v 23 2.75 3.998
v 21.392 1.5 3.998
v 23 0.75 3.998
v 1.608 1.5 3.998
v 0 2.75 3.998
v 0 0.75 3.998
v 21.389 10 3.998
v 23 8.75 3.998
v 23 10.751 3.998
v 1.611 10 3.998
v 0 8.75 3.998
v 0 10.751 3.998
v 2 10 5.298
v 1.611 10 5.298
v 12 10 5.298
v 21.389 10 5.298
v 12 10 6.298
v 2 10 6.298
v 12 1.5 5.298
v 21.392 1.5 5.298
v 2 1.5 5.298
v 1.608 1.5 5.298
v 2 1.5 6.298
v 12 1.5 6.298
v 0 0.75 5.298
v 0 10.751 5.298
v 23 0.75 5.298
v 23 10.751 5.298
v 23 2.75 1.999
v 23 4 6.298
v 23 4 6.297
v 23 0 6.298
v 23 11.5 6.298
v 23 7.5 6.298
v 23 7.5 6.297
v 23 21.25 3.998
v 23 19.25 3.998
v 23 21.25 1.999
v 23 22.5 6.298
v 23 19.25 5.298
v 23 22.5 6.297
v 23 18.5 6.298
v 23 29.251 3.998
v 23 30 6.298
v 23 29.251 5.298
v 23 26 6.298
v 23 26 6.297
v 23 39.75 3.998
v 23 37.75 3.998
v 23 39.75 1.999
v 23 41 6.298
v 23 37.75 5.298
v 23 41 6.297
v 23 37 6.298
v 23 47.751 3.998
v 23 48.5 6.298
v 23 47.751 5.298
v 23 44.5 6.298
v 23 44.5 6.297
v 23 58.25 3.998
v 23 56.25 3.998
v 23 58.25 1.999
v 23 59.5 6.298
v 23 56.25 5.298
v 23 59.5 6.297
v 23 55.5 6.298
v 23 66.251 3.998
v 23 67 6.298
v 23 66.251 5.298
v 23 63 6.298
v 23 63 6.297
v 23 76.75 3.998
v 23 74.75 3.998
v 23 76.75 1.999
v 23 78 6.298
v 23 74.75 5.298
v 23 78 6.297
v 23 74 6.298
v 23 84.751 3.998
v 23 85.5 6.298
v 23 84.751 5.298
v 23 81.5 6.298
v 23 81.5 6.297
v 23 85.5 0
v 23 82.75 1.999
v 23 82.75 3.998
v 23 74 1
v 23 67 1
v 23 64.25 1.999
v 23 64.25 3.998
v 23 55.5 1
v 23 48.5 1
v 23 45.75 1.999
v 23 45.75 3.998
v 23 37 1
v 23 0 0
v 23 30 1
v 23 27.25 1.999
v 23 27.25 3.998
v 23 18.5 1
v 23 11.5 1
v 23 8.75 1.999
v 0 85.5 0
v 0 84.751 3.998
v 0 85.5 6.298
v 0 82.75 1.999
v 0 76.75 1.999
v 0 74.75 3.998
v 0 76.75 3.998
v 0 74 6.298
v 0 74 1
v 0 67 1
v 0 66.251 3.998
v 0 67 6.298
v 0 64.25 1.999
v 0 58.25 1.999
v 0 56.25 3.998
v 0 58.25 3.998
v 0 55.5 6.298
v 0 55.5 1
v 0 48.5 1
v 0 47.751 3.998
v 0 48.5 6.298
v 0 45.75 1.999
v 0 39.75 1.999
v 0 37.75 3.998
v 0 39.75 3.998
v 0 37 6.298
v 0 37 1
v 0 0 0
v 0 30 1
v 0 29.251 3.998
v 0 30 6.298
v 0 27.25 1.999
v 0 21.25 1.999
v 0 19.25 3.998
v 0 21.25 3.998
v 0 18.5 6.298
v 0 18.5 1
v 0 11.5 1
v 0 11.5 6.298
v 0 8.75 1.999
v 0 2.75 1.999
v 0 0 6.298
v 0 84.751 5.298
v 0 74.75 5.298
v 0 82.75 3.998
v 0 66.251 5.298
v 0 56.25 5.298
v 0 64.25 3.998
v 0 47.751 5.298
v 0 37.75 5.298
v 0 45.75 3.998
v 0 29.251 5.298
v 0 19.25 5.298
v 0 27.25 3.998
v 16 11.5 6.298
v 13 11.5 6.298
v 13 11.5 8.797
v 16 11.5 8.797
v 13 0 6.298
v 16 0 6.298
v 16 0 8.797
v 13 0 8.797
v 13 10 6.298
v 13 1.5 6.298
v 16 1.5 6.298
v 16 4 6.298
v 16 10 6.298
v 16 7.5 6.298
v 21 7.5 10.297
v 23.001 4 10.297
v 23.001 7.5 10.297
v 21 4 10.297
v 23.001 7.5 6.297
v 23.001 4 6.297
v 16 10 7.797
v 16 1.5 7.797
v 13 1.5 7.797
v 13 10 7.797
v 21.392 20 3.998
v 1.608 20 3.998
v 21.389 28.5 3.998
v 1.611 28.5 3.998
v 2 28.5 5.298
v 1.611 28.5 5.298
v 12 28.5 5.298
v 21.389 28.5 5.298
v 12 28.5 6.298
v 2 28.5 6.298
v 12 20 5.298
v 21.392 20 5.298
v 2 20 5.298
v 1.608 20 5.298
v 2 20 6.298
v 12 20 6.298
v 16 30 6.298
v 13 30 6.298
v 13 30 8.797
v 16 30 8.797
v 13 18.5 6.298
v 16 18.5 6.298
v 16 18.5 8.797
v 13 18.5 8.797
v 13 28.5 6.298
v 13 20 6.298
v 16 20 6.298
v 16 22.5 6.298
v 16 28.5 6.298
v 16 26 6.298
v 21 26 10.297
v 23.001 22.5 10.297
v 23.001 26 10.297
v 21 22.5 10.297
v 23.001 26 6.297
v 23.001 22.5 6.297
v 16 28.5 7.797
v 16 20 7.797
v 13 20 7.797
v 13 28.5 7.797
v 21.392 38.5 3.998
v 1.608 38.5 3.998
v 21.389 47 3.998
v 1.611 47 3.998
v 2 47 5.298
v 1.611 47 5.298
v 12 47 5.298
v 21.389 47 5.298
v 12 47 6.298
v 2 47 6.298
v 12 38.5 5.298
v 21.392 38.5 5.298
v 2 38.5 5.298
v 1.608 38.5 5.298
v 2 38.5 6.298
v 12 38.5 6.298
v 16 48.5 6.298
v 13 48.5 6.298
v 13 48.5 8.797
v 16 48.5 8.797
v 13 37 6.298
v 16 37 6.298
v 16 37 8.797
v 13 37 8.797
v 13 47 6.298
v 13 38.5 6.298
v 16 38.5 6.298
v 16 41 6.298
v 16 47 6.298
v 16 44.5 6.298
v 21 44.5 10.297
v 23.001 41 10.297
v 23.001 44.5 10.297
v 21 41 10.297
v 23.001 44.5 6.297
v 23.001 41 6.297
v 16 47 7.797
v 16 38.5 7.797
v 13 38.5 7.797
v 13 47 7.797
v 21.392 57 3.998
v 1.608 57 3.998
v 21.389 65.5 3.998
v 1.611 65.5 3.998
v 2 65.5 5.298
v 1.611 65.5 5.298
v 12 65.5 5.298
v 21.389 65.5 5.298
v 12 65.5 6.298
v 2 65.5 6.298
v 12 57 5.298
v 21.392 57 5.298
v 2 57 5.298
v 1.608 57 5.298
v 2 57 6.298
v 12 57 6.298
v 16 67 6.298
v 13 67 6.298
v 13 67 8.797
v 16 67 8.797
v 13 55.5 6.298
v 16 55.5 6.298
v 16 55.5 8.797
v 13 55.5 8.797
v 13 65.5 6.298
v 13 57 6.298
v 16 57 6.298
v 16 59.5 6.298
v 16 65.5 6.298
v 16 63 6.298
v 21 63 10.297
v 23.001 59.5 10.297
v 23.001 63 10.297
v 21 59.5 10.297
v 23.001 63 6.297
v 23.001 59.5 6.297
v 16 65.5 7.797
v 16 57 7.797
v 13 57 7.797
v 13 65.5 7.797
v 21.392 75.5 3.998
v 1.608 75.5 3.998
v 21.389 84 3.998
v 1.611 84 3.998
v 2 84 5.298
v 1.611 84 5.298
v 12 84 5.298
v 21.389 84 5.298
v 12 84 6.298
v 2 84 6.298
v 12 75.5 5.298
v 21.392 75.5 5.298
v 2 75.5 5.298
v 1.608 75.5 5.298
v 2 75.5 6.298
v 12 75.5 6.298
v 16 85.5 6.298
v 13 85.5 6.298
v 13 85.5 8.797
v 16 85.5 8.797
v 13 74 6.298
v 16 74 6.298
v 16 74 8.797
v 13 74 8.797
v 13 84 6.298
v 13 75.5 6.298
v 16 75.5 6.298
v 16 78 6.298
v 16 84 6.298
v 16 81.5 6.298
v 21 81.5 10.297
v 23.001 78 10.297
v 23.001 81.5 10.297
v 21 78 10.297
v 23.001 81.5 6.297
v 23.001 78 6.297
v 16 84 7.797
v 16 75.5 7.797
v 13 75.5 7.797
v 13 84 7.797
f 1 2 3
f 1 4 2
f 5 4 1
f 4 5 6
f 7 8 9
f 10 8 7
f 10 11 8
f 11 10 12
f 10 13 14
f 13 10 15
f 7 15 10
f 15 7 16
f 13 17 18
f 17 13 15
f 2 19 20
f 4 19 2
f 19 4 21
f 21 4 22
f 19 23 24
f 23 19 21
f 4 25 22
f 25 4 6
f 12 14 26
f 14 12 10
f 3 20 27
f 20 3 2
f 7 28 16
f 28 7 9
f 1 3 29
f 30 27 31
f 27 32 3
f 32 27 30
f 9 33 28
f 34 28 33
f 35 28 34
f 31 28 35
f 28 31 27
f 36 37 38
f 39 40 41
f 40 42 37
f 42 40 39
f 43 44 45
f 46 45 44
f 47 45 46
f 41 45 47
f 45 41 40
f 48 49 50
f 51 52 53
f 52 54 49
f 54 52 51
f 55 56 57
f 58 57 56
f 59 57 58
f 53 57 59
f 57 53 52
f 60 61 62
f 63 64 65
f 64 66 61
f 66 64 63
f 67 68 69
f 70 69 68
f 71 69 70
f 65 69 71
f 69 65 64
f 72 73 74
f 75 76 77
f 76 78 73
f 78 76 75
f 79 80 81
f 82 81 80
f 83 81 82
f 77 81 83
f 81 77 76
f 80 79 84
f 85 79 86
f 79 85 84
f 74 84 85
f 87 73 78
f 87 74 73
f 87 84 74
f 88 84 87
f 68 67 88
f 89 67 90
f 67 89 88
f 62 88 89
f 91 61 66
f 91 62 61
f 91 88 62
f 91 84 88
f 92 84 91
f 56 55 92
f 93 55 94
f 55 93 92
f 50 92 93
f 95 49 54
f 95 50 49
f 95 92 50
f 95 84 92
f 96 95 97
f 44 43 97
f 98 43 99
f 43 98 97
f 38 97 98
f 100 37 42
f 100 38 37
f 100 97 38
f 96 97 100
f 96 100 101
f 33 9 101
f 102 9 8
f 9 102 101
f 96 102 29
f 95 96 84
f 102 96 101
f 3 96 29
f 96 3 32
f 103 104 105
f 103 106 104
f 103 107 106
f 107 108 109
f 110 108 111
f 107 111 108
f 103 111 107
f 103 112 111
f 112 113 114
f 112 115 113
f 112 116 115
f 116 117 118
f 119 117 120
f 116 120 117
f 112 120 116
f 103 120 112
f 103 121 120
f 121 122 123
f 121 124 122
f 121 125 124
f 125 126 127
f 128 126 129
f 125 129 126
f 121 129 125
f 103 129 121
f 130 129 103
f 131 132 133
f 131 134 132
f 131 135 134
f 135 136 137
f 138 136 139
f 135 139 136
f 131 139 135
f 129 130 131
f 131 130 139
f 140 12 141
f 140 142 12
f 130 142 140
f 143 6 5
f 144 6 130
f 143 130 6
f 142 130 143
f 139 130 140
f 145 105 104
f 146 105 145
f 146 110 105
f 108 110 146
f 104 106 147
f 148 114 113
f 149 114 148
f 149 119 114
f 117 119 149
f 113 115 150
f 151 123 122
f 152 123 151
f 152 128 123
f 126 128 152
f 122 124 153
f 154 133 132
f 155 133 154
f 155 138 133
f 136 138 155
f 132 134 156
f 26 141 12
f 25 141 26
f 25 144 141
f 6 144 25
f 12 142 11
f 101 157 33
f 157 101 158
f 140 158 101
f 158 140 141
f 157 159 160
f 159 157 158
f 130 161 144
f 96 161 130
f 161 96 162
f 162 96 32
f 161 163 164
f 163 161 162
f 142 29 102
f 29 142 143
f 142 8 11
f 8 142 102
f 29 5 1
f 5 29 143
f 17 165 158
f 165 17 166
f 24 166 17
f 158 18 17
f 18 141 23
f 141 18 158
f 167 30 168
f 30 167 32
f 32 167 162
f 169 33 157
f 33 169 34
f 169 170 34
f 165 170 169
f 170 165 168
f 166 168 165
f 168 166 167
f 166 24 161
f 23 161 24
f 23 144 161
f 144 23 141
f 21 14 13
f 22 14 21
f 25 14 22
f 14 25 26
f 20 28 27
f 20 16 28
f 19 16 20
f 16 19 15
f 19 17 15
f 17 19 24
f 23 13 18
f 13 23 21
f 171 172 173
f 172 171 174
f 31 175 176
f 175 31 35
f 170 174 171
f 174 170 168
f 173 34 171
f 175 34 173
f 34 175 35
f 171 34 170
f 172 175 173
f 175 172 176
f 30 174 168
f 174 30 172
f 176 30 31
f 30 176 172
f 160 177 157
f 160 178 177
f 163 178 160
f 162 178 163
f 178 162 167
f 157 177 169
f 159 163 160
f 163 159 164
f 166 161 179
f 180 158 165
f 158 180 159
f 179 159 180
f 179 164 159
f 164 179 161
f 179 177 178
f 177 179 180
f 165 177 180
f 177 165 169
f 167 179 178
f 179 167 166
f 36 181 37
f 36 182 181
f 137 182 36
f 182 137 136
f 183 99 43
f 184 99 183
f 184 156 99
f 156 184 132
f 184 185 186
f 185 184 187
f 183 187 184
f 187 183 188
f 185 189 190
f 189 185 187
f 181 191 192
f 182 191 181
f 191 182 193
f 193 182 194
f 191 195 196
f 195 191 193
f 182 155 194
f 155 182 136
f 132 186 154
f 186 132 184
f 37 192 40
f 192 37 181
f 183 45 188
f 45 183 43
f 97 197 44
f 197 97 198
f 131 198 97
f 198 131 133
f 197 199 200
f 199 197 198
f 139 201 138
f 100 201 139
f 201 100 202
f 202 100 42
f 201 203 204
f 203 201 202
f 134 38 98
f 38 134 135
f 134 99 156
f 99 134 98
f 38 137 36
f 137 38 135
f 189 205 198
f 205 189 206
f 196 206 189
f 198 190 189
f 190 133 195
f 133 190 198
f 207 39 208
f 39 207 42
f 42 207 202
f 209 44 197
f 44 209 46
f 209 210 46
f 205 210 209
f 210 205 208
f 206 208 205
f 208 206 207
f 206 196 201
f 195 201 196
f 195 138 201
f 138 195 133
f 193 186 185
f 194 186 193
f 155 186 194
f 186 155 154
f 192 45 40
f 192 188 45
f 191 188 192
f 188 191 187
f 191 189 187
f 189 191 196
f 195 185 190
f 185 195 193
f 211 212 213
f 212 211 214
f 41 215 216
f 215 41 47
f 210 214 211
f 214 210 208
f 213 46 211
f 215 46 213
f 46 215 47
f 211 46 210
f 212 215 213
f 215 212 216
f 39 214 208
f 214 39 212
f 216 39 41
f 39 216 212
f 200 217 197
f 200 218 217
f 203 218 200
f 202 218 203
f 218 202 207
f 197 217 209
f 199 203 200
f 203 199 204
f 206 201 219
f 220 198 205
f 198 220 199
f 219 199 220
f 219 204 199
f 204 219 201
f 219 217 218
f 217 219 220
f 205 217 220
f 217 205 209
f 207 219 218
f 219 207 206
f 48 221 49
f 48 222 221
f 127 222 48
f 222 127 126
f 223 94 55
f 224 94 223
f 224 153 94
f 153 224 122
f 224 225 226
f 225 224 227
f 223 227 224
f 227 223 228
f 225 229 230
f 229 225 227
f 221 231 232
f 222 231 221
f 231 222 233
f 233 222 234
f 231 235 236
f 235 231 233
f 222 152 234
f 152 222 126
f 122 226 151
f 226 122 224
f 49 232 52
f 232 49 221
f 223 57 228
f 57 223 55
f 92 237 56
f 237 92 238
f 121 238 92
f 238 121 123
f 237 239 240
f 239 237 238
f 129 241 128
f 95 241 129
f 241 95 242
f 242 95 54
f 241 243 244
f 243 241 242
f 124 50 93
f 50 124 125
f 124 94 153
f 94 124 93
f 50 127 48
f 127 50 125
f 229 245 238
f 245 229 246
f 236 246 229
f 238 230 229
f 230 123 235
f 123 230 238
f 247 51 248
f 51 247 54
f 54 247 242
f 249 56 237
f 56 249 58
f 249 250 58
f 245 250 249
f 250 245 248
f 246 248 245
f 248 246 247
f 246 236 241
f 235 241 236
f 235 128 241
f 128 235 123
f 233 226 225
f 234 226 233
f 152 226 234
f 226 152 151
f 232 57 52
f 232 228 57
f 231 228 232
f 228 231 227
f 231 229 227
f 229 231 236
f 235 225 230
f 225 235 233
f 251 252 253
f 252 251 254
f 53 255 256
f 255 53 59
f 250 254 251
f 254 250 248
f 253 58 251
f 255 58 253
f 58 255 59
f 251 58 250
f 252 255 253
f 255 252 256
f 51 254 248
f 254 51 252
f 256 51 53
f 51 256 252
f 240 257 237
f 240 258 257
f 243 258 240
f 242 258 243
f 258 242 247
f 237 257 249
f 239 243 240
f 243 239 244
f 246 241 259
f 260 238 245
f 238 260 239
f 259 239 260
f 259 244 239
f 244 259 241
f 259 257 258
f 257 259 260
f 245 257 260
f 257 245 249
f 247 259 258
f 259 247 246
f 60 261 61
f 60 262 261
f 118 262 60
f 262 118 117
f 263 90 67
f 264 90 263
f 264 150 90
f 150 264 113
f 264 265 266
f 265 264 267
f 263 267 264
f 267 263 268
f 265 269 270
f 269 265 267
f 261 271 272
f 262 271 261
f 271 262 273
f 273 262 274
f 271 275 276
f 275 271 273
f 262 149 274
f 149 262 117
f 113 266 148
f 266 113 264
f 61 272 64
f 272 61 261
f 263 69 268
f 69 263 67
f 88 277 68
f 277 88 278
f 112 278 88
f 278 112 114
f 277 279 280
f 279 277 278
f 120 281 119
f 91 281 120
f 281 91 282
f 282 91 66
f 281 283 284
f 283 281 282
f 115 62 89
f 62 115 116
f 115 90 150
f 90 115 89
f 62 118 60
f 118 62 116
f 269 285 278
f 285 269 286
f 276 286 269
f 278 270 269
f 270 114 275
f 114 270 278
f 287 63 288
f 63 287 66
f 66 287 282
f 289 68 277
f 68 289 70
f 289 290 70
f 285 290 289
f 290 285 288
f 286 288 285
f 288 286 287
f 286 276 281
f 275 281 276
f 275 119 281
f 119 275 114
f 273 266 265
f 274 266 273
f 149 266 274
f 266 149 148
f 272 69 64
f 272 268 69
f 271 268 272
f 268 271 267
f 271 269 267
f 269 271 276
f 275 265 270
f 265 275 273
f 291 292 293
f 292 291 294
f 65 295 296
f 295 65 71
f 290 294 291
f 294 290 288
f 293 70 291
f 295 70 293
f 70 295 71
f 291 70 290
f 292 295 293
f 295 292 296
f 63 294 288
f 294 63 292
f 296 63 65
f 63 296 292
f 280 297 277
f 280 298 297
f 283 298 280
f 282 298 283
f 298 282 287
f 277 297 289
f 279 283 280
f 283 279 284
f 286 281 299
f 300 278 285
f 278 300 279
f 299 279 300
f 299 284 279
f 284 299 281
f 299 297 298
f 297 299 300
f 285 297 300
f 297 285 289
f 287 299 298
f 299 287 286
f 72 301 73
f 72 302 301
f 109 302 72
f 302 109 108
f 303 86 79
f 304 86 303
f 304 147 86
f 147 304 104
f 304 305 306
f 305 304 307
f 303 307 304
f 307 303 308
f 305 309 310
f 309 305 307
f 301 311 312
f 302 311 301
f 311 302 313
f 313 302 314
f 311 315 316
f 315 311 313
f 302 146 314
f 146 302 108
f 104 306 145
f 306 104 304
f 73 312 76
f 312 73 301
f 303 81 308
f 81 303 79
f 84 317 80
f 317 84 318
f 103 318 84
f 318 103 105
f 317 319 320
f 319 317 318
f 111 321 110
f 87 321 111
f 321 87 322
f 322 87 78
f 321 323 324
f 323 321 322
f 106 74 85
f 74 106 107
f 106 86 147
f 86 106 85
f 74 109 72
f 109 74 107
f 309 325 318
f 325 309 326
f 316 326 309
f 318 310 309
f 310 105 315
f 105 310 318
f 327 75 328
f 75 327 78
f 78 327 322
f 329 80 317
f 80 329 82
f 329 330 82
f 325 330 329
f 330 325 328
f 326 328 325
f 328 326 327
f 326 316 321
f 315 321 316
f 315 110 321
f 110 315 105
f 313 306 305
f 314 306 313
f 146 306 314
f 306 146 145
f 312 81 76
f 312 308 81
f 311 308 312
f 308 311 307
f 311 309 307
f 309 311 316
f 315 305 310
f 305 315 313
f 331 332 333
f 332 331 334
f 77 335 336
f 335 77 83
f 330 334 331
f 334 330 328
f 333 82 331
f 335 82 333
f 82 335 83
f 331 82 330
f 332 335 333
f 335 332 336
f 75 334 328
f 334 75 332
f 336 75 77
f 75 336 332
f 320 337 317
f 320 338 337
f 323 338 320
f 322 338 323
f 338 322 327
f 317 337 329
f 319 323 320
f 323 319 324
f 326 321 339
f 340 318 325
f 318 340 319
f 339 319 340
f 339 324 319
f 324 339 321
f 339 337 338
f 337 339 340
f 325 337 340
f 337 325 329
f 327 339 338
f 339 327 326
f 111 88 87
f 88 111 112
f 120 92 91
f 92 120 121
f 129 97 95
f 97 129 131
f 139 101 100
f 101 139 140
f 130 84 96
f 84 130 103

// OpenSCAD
// TODO: cleanup.

eps1 = 0.001;
eps2 = 2*eps1;

// Main body
total_length = 23;  // should be 23
side_wall_width = 1.5;
bottom_thickness = 1; 


// base slot
tape_slot_width = 8.5;
tape_slot_height = 1.3;


// Part slot
part_slot_width = 6;
part_slot_height = 2;

part_slot_taper_angle = 25;

top_thickness = 1;

bridge_gap = 1.5;
bridge_width = 3;
bridge_top_thickness = 1;
bridge_height = bridge_gap + bridge_top_thickness;


ramp_width = 3.5;
ramp_height = 4;
ramp_length = 5;
ramp_tail_length = 2;
ramp_offset = 16;

plate_thickness = 1;
array_size = 5;
inter_unit_space = 7;

base_length = total_length;
base_height = bottom_thickness + part_slot_height + tape_slot_height;
base_width = tape_slot_width + 2*side_wall_width;


module tape_slot_taper(x, y, a) {
  translate([x, y, 0])
  rotate([0, 0, a])
  translate([-3*side_wall_width/2, 0, 0])  cube([3*side_wall_width, eps1, tape_slot_height+eps2]);
}

module base_body() {
  cube([base_length, base_width, base_height]);
}

module parts_slot() {
 translate([-eps1, (base_width-part_slot_width)/2, 0]) 
    cube([base_length+eps2, part_slot_width, part_slot_height]);  
}

module tape_slot() {
 a = part_slot_taper_angle;
 translate([-eps1, (base_width-tape_slot_width)/2, 0]) cube([base_length+eps2, tape_slot_width, tape_slot_height+eps2]);

 hull() {
  tape_slot_taper(0,  side_wall_width/2, a);
  tape_slot_taper(0, base_width - side_wall_width/2, -a);
 }

 hull() {
 tape_slot_taper(total_length, side_wall_width/2, -a);
 tape_slot_taper(total_length, base_width - side_wall_width/2, a);
 }
}


module base_main() {
  difference() {
    base_body();
    translate([0, 0, bottom_thickness]) parts_slot();
    translate([0, 0, bottom_thickness+part_slot_height-eps1]) tape_slot();
  }
}

module top_ramp() {
  translate([0, (base_width-ramp_width)/2, 0]) hull() {
    cube([eps1, ramp_width, eps1]);
    translate([ramp_length, 0, 0])  cube([eps1, ramp_width, ramp_height]);
    translate([ramp_length+ramp_tail_length, 0, 0])  cube([eps1, ramp_width, ramp_height]);

  }
}

module top_hole(x, l, w) {
  translate([x, (base_width-w)/2, -eps1]) cube([l, w, top_thickness + eps2]);
}

module bridge_main() {
  difference() {
    cube([bridge_width, base_width, bridge_gap + bridge_top_thickness]);
    translate([-eps1, (base_width - tape_slot_width)/2, -eps1]) cube([bridge_width+eps2, tape_slot_width, bridge_gap+eps1]);
}
}

module top_main() {
  difference() {
  cube([base_length, base_width, top_thickness]);
  top_hole(2, 10, tape_slot_width);
}
  translate([ramp_offset, 0, top_thickness - eps1]) top_ramp();
}

// For printing without material support. Requires gluing of the three parts.
module disassembled_unit() {
  base_main();
  translate([0, -base_width * 1.2, 0]) top_main(); 
  translate([-4, 0, bridge_height]) rotate([0, 180, 0]) bridge_main();
}

module assembled_unit() {
   base_main();
   translate([0, 0, base_height-eps1]) top_main();
   translate([bridge_width + 10, 0,  base_height + top_thickness - eps2]) bridge_main();
}

module assembled_array() {
  width = array_size*base_width + (array_size-1)*inter_unit_space; 
  for ( i = [0 : array_size-1] ) {
    translate([0, i*(base_width + inter_unit_space), plate_thickness - eps1]) assembled_unit();
  }
  cube([base_length, width, plate_thickness]);
}

assembled_array();

//disassembled_unit();
